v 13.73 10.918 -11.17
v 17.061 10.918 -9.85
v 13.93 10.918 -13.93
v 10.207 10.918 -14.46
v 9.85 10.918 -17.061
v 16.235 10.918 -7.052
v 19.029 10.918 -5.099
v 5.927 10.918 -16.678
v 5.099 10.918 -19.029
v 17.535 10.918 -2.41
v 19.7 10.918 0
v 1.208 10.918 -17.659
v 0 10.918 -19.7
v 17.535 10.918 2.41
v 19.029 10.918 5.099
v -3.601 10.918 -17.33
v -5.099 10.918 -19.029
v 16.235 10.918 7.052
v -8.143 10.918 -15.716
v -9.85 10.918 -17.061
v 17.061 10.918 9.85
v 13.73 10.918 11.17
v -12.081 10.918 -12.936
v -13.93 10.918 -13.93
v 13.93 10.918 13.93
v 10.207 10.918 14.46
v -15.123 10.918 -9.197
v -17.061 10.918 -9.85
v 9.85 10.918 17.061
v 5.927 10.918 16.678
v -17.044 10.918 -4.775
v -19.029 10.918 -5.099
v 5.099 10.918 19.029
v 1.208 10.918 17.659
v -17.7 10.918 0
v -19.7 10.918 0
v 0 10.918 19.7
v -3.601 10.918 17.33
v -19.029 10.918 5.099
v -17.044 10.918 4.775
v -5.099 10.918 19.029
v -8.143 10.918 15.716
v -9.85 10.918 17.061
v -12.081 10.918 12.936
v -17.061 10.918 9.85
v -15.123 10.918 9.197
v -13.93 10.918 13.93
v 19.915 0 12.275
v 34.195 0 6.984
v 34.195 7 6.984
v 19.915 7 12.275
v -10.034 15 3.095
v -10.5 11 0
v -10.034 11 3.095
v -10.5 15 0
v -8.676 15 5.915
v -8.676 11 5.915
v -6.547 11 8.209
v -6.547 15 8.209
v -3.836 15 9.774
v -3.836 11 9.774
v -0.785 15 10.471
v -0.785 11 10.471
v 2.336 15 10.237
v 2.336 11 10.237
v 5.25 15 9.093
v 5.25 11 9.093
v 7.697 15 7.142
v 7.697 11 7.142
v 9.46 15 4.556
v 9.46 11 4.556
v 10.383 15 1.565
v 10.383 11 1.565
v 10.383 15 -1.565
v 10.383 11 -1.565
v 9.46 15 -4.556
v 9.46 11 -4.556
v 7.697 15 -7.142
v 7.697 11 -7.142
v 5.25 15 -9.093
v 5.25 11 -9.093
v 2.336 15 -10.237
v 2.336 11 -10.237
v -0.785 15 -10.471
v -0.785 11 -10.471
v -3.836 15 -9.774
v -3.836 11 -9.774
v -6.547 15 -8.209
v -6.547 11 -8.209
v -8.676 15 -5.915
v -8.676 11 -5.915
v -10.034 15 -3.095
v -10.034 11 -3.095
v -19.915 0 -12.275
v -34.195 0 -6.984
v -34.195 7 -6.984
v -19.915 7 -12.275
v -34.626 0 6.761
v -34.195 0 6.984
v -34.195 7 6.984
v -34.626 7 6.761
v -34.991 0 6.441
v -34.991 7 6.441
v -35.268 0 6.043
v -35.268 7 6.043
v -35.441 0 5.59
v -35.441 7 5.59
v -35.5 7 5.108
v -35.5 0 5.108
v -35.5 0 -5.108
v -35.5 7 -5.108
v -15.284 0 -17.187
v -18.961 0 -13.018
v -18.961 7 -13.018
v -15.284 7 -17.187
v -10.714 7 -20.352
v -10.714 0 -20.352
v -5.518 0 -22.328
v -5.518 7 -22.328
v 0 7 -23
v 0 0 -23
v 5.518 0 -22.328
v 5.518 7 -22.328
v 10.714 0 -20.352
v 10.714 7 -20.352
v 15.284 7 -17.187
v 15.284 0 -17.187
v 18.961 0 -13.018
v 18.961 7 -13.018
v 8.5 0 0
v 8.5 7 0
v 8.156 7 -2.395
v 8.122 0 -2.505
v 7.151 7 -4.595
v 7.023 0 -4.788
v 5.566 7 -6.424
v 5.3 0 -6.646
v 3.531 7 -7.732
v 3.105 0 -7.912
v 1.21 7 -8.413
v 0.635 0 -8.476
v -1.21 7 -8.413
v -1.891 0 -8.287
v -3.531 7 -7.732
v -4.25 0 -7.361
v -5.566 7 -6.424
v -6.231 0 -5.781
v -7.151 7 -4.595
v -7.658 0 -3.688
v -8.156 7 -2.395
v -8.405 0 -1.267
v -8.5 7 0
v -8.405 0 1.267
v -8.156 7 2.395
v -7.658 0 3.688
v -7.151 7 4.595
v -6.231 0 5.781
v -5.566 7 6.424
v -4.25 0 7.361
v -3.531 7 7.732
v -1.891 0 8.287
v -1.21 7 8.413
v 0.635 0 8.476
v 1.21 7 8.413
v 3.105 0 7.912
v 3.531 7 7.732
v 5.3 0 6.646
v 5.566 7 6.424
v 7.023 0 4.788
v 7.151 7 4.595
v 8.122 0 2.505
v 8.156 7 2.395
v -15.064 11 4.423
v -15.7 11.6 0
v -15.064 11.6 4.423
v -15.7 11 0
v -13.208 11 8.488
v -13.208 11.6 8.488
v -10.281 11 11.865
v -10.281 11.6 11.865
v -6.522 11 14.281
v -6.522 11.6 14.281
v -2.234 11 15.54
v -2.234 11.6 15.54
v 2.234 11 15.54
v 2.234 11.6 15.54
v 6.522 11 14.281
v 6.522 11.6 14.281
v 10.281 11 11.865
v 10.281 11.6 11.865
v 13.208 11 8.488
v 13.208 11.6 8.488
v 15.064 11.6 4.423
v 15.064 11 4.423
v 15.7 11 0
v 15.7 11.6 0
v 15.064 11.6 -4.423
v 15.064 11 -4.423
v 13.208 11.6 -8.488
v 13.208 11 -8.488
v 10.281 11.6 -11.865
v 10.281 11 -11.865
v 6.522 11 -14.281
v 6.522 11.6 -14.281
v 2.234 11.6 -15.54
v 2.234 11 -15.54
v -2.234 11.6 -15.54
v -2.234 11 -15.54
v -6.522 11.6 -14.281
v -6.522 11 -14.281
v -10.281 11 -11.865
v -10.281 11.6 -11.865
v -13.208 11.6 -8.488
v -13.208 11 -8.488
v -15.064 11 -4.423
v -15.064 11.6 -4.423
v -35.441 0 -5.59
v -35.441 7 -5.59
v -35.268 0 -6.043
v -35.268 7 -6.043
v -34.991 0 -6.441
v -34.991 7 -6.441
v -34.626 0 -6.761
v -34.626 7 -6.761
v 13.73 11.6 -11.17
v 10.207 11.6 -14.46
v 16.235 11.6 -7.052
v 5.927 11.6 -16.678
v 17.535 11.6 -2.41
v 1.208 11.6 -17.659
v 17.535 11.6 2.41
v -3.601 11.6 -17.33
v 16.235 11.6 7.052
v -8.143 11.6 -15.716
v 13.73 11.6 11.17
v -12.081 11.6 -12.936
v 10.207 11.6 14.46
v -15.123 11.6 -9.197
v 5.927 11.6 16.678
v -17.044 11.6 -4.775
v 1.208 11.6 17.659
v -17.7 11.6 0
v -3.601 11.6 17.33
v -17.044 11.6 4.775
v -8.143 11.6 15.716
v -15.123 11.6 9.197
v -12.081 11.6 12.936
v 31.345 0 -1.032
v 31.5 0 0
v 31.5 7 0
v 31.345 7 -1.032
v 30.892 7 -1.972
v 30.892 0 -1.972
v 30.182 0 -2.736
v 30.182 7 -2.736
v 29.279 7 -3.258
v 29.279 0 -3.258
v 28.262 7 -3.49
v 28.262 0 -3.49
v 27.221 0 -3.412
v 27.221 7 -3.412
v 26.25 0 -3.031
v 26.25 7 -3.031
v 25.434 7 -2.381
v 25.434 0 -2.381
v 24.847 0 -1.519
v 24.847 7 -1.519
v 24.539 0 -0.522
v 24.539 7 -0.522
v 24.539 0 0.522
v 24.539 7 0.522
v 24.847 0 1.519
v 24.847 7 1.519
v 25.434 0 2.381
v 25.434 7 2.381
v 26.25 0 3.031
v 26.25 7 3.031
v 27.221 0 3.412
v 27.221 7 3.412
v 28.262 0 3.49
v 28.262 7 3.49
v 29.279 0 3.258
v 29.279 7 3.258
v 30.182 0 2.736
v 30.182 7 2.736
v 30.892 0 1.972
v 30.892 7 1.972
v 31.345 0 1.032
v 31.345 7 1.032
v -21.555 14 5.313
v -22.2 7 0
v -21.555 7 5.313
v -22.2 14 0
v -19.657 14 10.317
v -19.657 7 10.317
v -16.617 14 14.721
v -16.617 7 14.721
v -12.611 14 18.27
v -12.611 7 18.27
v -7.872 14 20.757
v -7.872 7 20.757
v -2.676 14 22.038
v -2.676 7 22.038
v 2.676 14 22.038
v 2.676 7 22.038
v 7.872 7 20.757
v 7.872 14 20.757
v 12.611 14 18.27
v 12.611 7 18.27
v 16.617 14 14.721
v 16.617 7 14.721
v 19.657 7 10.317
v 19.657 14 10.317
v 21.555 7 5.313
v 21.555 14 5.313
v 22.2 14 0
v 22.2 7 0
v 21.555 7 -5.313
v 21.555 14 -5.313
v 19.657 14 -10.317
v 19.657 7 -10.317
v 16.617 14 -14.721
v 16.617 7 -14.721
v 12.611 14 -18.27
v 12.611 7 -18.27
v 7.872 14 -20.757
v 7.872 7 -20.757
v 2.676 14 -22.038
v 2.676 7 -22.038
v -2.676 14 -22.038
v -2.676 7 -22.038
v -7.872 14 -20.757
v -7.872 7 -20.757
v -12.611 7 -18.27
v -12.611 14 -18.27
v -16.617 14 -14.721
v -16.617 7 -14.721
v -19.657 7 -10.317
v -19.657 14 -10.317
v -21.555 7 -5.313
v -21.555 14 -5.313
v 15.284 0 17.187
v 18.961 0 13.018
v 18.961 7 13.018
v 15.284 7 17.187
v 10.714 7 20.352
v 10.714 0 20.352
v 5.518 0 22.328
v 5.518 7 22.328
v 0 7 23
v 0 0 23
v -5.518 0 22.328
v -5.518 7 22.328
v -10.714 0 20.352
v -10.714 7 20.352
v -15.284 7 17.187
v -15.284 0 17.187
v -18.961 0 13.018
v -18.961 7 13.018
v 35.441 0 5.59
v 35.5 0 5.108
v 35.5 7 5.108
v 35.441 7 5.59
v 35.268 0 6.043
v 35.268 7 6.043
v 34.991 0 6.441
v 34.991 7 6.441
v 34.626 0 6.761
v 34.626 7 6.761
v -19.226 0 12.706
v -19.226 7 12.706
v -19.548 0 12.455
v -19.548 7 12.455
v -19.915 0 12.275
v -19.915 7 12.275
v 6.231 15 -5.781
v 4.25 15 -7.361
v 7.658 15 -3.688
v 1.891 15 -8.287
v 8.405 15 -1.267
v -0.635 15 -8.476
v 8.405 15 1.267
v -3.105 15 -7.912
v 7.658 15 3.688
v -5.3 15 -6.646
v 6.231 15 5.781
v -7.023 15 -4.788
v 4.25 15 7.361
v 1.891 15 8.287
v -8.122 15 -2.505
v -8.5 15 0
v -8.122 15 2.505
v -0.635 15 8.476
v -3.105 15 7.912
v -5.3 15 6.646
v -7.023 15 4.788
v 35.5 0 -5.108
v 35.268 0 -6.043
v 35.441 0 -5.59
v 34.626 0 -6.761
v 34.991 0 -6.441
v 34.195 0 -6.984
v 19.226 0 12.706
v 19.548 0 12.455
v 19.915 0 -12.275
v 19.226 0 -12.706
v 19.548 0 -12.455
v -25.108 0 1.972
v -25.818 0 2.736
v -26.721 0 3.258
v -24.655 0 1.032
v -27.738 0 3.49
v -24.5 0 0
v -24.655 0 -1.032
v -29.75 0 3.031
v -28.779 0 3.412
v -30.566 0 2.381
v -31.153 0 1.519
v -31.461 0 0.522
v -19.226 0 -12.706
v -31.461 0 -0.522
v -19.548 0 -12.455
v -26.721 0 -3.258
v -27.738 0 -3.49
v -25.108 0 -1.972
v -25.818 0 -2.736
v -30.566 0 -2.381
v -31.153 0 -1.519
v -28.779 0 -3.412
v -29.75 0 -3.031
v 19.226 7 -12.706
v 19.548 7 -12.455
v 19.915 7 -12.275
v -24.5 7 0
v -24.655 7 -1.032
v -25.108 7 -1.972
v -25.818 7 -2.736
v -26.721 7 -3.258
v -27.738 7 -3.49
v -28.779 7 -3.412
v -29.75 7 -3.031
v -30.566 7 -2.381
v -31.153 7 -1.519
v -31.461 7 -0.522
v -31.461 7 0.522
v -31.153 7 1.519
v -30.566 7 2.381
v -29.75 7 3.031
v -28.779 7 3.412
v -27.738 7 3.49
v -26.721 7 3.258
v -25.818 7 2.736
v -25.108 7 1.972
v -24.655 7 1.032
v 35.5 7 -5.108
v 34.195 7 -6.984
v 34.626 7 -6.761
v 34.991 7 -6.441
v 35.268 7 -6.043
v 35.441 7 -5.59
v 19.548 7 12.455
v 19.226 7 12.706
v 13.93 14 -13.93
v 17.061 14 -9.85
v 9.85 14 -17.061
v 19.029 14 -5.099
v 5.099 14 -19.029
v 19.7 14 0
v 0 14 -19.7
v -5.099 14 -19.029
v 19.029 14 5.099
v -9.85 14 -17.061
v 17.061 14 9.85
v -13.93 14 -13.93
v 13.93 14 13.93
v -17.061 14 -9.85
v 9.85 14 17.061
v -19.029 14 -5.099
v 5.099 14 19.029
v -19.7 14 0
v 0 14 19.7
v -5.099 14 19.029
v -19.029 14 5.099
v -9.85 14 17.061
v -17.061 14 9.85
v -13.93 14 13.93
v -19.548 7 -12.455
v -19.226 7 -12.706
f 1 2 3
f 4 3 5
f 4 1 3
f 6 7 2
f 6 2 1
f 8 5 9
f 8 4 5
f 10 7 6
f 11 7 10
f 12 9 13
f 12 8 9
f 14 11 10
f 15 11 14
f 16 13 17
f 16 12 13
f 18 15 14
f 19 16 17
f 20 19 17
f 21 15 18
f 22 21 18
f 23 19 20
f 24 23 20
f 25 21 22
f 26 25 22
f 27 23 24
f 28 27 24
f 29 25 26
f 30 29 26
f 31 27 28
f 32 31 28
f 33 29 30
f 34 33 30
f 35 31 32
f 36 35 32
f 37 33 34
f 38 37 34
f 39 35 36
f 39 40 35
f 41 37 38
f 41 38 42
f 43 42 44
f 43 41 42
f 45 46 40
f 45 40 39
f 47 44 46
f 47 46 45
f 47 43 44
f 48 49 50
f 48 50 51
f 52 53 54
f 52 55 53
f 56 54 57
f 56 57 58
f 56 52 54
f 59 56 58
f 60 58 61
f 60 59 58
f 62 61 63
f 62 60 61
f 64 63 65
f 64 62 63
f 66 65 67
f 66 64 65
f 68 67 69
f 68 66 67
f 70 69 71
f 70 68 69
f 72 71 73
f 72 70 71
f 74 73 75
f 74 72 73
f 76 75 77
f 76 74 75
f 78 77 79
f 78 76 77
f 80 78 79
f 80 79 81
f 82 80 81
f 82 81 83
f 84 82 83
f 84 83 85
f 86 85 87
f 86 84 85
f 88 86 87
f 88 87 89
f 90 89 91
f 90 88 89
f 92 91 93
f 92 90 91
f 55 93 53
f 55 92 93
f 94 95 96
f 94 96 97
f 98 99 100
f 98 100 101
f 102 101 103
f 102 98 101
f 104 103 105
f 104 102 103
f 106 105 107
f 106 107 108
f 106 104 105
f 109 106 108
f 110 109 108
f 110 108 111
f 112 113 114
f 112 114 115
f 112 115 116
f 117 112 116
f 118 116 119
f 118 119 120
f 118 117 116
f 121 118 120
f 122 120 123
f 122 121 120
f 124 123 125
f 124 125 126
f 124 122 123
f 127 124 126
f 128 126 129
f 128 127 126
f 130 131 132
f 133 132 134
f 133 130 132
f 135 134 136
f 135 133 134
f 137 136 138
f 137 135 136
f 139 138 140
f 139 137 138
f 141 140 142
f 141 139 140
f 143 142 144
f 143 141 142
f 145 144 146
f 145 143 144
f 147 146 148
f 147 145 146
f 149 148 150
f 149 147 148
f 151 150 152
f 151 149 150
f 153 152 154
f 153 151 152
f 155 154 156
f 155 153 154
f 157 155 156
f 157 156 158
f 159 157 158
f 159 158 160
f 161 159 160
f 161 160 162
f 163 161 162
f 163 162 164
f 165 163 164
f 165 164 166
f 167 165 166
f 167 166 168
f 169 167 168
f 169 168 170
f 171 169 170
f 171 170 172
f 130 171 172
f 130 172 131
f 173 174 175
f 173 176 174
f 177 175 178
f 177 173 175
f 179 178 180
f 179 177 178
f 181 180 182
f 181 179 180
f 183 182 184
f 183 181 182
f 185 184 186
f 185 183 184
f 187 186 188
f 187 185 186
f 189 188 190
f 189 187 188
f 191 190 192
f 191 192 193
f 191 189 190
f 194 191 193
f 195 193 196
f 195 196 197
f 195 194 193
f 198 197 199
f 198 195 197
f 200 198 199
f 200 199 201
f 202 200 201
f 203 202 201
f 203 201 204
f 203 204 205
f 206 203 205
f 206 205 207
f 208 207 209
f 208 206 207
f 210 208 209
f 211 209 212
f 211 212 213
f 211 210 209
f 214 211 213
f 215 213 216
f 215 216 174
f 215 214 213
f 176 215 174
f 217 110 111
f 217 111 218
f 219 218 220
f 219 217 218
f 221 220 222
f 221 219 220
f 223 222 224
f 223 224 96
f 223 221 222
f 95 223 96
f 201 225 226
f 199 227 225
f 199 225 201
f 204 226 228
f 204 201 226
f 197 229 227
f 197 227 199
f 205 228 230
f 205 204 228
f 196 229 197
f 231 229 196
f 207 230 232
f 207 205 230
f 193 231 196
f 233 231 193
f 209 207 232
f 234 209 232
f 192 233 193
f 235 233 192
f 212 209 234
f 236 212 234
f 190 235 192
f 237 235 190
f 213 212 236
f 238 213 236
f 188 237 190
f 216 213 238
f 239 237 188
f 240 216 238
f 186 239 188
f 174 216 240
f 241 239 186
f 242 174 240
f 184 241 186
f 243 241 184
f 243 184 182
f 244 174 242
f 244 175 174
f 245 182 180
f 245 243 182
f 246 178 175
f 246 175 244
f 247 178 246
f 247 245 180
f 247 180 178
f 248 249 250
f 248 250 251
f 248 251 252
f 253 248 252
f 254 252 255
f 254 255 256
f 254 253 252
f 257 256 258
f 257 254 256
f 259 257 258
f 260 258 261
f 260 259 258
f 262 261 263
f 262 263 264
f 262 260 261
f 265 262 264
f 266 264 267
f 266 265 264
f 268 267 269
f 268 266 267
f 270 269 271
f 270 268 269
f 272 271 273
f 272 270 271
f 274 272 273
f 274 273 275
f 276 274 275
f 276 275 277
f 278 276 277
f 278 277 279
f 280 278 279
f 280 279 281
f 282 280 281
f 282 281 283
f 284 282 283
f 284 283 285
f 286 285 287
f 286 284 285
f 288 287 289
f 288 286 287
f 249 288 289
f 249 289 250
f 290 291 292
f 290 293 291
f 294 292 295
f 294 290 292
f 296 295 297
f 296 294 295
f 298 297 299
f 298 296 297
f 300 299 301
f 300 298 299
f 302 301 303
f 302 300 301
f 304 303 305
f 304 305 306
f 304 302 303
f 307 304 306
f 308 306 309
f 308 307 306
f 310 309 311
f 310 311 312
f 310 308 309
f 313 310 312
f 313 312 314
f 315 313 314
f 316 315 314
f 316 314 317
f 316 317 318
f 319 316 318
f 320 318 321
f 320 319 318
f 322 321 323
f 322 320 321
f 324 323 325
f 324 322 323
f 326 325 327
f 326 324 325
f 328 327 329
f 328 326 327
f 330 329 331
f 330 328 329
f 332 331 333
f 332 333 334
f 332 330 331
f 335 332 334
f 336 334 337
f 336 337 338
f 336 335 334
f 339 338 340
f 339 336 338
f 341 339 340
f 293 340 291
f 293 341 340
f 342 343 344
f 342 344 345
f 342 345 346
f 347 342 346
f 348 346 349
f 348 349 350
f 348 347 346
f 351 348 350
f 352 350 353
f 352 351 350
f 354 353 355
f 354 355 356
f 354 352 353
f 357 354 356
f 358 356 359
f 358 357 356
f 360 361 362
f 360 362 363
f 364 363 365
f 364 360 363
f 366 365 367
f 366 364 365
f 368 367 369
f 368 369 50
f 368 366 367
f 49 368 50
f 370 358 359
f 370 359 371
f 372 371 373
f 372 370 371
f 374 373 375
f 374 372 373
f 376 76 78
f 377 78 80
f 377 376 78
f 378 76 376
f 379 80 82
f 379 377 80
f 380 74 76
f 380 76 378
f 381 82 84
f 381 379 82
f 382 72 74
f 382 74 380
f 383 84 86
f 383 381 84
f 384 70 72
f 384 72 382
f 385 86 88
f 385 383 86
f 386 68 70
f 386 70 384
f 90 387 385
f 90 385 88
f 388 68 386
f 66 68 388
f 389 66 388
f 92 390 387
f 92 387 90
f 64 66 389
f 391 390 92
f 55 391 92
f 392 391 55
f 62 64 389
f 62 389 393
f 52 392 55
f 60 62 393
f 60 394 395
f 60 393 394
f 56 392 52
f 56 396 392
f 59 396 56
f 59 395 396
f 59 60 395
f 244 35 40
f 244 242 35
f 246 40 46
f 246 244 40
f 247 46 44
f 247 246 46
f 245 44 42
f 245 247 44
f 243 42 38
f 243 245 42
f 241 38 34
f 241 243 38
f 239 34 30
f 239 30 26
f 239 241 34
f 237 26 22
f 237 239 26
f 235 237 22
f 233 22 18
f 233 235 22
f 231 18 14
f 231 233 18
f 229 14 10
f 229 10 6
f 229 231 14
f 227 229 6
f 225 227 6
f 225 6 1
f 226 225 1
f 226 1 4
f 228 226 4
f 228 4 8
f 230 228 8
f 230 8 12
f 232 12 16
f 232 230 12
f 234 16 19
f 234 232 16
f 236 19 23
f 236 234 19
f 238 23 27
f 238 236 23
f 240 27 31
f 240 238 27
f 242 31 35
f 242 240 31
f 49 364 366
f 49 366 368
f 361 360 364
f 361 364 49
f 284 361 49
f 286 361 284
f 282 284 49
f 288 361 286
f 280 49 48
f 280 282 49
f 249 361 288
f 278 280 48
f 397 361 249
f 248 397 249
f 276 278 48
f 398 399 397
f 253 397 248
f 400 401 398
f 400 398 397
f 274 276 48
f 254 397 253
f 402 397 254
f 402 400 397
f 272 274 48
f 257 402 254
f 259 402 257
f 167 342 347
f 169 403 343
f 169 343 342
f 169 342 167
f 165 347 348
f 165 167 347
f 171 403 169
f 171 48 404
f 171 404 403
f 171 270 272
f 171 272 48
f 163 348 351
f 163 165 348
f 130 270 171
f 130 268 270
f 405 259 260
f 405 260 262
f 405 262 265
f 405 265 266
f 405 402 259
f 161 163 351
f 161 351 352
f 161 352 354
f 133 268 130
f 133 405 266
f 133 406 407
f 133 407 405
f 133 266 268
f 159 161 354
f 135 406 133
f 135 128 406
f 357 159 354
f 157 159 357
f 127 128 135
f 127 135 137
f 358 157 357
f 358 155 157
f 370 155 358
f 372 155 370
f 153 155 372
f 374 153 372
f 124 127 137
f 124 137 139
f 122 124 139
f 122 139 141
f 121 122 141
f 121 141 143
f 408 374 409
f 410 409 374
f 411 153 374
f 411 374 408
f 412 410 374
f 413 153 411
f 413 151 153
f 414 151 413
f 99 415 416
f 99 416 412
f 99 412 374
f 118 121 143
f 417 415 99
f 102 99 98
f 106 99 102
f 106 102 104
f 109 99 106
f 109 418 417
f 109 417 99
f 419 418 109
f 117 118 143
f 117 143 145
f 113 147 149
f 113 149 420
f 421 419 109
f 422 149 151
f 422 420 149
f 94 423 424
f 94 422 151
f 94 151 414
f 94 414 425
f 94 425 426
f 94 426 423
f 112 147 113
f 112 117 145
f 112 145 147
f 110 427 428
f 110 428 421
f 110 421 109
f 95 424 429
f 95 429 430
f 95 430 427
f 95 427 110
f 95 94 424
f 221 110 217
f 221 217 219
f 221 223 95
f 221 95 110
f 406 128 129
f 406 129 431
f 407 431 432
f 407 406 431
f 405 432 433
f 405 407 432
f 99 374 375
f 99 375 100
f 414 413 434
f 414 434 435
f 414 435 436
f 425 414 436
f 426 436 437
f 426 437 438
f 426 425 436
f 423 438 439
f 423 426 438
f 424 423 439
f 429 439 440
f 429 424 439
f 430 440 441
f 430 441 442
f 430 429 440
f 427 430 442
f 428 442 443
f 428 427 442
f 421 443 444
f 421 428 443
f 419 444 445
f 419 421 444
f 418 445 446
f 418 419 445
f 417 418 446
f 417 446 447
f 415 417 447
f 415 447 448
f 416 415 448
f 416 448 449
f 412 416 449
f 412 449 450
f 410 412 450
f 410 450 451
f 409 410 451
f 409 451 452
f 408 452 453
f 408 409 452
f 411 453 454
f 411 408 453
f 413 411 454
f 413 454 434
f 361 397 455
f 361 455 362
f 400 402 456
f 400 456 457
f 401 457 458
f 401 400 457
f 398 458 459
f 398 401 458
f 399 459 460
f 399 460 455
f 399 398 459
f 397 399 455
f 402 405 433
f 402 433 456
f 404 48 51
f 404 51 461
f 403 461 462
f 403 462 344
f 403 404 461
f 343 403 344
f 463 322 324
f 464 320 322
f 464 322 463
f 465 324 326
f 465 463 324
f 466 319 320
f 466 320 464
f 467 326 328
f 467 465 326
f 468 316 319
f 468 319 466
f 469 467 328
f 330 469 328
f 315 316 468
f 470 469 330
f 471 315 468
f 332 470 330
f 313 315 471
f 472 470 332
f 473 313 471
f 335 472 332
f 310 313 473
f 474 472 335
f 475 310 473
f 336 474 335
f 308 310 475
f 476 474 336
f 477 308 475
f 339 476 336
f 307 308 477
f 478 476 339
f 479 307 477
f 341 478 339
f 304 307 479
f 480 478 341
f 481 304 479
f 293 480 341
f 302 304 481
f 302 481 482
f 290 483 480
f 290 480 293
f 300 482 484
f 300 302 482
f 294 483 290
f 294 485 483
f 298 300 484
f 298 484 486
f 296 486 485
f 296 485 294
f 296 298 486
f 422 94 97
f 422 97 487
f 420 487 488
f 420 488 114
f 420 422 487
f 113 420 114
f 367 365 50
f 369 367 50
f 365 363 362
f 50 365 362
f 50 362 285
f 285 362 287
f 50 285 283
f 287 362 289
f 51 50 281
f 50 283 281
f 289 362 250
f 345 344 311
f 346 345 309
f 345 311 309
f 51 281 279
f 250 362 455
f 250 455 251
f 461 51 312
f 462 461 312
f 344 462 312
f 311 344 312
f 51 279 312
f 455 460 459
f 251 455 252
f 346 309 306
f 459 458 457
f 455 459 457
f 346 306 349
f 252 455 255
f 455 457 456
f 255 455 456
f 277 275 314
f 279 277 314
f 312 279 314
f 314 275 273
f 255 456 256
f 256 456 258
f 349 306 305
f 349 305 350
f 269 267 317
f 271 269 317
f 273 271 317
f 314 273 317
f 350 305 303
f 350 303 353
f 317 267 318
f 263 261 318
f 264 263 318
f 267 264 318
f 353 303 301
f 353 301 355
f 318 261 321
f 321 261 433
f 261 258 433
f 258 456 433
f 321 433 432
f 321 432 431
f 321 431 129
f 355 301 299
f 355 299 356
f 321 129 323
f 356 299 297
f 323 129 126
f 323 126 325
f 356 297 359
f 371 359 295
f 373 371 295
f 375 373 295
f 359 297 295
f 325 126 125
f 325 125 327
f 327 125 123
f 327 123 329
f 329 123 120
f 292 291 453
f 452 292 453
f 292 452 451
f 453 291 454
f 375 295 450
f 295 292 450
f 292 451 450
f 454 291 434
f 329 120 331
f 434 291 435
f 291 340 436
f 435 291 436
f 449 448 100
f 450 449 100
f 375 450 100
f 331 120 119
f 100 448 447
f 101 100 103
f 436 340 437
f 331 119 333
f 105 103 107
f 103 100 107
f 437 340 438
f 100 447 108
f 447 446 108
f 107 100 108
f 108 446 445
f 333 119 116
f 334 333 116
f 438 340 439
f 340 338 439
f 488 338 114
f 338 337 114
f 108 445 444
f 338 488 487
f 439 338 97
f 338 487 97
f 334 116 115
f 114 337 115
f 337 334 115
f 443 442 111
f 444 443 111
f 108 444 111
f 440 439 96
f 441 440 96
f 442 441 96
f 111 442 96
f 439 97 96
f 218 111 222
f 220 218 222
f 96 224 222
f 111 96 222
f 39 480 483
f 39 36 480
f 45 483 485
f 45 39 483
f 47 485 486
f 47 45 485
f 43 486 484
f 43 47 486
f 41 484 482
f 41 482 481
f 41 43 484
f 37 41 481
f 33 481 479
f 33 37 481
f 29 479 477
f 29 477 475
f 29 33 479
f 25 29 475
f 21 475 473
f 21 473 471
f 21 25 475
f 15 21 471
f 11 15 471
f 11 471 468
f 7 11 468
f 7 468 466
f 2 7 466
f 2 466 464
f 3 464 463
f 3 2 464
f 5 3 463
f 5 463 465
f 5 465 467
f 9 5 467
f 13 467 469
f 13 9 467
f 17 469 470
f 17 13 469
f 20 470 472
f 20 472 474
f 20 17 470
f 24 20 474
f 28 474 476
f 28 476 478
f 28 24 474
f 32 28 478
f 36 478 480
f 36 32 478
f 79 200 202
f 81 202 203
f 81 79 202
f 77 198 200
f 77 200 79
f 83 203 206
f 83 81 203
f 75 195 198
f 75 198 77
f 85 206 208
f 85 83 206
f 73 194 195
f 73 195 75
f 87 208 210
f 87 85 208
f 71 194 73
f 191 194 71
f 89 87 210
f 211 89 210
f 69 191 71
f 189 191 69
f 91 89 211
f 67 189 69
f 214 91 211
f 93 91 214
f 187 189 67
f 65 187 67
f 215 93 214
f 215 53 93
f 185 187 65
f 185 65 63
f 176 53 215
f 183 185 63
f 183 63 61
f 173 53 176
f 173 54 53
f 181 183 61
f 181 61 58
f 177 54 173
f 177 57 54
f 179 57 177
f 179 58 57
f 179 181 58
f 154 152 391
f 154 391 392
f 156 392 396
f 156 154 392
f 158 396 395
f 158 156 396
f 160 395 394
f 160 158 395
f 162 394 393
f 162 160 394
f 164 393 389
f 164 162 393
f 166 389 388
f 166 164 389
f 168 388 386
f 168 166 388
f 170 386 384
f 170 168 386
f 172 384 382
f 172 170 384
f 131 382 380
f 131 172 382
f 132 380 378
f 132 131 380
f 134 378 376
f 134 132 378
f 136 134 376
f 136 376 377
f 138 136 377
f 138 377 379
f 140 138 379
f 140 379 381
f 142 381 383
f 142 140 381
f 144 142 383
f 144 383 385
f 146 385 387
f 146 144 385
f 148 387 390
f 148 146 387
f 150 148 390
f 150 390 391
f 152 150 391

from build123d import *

# Parameters (mm, degrees)
SKETCH1_R           = 3.5
SKETCH1_R_2         = 8.5
BOSS_EXTRUDE1_DEPTH = 7


with BuildPart() as part:
    # Sketch1 → Boss-Extrude1 (new body)
    with BuildSketch(Plane(origin=(0, 0, 0), x_dir=(1, 0, 0), z_dir=(0, 1, 0))):
        with BuildLine():
            Line((19.915308817, 12.274508393), (34.194882732, 6.983577796))
            ThreePointArc((34.194882732, 6.983577796), (35.141609799, 6.250591667), (35.5, 5.108174376))
            Line((35.5, 5.108174376), (35.5, -5.108174376))
            ThreePointArc((35.5, -5.108174376), (35.141609799, -6.250591667), (34.194882732, -6.983577796))
            Line((34.194882732, -6.983577796), (19.915308817, -12.274508393))
            ThreePointArc((19.915308817, -12.274508393), (19.380803519, -12.572380491), (18.961376225, -13.017918868))
            ThreePointArc((18.961376225, -13.017918868), (0, -23), (-18.961376225, -13.017918868))
            ThreePointArc((-18.961376225, -13.017918868), (-19.380803519, -12.572380491), (-19.915308817, -12.274508393))
            Line((-19.915308817, -12.274508393), (-34.194882732, -6.983577796))
            ThreePointArc((-34.194882732, -6.983577796), (-35.141609799, -6.250591667), (-35.5, -5.108174376))
            Line((-35.5, -5.108174376), (-35.5, 5.108174376))
            ThreePointArc((-35.5, 5.108174376), (-35.141609799, 6.250591667), (-34.194882732, 6.983577796))
            Line((-34.194882732, 6.983577796), (-19.915308817, 12.274508393))
            ThreePointArc((-19.915308817, 12.274508393), (-19.380803519, 12.572380491), (-18.961376225, 13.017918868))
            ThreePointArc((-18.961376225, 13.017918868), (0, 23), (18.961376225, 13.017918868))
            ThreePointArc((18.961376225, 13.017918868), (19.380803519, 12.572380491), (19.915308817, 12.274508393))
        make_face()
        with Locations((28, 0)):
            Circle(SKETCH1_R, mode=Mode.SUBTRACT)
        with Locations((-28, 0)):
            Circle(SKETCH1_R, mode=Mode.SUBTRACT)
        Circle(SKETCH1_R_2, mode=Mode.SUBTRACT)
    extrude(amount=BOSS_EXTRUDE1_DEPTH)

    # Sketch2 → Revolve1 (revolve)
    with BuildSketch(Plane.XY):
        Polygon((-8.5, 15), (-8.5, 7), (-22.2, 7), (-22.2, 14), (-19.7, 14), (-19.7, 10.918286082), (-17.7, 10.918286082), (-17.7, 11.6), (-15.7, 11.6), (-15.7, 11), (-10.5, 11), (-10.5, 15), align=None)
    revolve(axis=Axis((0, 0, 0), (0, 1, 0)))


solid = part.part
